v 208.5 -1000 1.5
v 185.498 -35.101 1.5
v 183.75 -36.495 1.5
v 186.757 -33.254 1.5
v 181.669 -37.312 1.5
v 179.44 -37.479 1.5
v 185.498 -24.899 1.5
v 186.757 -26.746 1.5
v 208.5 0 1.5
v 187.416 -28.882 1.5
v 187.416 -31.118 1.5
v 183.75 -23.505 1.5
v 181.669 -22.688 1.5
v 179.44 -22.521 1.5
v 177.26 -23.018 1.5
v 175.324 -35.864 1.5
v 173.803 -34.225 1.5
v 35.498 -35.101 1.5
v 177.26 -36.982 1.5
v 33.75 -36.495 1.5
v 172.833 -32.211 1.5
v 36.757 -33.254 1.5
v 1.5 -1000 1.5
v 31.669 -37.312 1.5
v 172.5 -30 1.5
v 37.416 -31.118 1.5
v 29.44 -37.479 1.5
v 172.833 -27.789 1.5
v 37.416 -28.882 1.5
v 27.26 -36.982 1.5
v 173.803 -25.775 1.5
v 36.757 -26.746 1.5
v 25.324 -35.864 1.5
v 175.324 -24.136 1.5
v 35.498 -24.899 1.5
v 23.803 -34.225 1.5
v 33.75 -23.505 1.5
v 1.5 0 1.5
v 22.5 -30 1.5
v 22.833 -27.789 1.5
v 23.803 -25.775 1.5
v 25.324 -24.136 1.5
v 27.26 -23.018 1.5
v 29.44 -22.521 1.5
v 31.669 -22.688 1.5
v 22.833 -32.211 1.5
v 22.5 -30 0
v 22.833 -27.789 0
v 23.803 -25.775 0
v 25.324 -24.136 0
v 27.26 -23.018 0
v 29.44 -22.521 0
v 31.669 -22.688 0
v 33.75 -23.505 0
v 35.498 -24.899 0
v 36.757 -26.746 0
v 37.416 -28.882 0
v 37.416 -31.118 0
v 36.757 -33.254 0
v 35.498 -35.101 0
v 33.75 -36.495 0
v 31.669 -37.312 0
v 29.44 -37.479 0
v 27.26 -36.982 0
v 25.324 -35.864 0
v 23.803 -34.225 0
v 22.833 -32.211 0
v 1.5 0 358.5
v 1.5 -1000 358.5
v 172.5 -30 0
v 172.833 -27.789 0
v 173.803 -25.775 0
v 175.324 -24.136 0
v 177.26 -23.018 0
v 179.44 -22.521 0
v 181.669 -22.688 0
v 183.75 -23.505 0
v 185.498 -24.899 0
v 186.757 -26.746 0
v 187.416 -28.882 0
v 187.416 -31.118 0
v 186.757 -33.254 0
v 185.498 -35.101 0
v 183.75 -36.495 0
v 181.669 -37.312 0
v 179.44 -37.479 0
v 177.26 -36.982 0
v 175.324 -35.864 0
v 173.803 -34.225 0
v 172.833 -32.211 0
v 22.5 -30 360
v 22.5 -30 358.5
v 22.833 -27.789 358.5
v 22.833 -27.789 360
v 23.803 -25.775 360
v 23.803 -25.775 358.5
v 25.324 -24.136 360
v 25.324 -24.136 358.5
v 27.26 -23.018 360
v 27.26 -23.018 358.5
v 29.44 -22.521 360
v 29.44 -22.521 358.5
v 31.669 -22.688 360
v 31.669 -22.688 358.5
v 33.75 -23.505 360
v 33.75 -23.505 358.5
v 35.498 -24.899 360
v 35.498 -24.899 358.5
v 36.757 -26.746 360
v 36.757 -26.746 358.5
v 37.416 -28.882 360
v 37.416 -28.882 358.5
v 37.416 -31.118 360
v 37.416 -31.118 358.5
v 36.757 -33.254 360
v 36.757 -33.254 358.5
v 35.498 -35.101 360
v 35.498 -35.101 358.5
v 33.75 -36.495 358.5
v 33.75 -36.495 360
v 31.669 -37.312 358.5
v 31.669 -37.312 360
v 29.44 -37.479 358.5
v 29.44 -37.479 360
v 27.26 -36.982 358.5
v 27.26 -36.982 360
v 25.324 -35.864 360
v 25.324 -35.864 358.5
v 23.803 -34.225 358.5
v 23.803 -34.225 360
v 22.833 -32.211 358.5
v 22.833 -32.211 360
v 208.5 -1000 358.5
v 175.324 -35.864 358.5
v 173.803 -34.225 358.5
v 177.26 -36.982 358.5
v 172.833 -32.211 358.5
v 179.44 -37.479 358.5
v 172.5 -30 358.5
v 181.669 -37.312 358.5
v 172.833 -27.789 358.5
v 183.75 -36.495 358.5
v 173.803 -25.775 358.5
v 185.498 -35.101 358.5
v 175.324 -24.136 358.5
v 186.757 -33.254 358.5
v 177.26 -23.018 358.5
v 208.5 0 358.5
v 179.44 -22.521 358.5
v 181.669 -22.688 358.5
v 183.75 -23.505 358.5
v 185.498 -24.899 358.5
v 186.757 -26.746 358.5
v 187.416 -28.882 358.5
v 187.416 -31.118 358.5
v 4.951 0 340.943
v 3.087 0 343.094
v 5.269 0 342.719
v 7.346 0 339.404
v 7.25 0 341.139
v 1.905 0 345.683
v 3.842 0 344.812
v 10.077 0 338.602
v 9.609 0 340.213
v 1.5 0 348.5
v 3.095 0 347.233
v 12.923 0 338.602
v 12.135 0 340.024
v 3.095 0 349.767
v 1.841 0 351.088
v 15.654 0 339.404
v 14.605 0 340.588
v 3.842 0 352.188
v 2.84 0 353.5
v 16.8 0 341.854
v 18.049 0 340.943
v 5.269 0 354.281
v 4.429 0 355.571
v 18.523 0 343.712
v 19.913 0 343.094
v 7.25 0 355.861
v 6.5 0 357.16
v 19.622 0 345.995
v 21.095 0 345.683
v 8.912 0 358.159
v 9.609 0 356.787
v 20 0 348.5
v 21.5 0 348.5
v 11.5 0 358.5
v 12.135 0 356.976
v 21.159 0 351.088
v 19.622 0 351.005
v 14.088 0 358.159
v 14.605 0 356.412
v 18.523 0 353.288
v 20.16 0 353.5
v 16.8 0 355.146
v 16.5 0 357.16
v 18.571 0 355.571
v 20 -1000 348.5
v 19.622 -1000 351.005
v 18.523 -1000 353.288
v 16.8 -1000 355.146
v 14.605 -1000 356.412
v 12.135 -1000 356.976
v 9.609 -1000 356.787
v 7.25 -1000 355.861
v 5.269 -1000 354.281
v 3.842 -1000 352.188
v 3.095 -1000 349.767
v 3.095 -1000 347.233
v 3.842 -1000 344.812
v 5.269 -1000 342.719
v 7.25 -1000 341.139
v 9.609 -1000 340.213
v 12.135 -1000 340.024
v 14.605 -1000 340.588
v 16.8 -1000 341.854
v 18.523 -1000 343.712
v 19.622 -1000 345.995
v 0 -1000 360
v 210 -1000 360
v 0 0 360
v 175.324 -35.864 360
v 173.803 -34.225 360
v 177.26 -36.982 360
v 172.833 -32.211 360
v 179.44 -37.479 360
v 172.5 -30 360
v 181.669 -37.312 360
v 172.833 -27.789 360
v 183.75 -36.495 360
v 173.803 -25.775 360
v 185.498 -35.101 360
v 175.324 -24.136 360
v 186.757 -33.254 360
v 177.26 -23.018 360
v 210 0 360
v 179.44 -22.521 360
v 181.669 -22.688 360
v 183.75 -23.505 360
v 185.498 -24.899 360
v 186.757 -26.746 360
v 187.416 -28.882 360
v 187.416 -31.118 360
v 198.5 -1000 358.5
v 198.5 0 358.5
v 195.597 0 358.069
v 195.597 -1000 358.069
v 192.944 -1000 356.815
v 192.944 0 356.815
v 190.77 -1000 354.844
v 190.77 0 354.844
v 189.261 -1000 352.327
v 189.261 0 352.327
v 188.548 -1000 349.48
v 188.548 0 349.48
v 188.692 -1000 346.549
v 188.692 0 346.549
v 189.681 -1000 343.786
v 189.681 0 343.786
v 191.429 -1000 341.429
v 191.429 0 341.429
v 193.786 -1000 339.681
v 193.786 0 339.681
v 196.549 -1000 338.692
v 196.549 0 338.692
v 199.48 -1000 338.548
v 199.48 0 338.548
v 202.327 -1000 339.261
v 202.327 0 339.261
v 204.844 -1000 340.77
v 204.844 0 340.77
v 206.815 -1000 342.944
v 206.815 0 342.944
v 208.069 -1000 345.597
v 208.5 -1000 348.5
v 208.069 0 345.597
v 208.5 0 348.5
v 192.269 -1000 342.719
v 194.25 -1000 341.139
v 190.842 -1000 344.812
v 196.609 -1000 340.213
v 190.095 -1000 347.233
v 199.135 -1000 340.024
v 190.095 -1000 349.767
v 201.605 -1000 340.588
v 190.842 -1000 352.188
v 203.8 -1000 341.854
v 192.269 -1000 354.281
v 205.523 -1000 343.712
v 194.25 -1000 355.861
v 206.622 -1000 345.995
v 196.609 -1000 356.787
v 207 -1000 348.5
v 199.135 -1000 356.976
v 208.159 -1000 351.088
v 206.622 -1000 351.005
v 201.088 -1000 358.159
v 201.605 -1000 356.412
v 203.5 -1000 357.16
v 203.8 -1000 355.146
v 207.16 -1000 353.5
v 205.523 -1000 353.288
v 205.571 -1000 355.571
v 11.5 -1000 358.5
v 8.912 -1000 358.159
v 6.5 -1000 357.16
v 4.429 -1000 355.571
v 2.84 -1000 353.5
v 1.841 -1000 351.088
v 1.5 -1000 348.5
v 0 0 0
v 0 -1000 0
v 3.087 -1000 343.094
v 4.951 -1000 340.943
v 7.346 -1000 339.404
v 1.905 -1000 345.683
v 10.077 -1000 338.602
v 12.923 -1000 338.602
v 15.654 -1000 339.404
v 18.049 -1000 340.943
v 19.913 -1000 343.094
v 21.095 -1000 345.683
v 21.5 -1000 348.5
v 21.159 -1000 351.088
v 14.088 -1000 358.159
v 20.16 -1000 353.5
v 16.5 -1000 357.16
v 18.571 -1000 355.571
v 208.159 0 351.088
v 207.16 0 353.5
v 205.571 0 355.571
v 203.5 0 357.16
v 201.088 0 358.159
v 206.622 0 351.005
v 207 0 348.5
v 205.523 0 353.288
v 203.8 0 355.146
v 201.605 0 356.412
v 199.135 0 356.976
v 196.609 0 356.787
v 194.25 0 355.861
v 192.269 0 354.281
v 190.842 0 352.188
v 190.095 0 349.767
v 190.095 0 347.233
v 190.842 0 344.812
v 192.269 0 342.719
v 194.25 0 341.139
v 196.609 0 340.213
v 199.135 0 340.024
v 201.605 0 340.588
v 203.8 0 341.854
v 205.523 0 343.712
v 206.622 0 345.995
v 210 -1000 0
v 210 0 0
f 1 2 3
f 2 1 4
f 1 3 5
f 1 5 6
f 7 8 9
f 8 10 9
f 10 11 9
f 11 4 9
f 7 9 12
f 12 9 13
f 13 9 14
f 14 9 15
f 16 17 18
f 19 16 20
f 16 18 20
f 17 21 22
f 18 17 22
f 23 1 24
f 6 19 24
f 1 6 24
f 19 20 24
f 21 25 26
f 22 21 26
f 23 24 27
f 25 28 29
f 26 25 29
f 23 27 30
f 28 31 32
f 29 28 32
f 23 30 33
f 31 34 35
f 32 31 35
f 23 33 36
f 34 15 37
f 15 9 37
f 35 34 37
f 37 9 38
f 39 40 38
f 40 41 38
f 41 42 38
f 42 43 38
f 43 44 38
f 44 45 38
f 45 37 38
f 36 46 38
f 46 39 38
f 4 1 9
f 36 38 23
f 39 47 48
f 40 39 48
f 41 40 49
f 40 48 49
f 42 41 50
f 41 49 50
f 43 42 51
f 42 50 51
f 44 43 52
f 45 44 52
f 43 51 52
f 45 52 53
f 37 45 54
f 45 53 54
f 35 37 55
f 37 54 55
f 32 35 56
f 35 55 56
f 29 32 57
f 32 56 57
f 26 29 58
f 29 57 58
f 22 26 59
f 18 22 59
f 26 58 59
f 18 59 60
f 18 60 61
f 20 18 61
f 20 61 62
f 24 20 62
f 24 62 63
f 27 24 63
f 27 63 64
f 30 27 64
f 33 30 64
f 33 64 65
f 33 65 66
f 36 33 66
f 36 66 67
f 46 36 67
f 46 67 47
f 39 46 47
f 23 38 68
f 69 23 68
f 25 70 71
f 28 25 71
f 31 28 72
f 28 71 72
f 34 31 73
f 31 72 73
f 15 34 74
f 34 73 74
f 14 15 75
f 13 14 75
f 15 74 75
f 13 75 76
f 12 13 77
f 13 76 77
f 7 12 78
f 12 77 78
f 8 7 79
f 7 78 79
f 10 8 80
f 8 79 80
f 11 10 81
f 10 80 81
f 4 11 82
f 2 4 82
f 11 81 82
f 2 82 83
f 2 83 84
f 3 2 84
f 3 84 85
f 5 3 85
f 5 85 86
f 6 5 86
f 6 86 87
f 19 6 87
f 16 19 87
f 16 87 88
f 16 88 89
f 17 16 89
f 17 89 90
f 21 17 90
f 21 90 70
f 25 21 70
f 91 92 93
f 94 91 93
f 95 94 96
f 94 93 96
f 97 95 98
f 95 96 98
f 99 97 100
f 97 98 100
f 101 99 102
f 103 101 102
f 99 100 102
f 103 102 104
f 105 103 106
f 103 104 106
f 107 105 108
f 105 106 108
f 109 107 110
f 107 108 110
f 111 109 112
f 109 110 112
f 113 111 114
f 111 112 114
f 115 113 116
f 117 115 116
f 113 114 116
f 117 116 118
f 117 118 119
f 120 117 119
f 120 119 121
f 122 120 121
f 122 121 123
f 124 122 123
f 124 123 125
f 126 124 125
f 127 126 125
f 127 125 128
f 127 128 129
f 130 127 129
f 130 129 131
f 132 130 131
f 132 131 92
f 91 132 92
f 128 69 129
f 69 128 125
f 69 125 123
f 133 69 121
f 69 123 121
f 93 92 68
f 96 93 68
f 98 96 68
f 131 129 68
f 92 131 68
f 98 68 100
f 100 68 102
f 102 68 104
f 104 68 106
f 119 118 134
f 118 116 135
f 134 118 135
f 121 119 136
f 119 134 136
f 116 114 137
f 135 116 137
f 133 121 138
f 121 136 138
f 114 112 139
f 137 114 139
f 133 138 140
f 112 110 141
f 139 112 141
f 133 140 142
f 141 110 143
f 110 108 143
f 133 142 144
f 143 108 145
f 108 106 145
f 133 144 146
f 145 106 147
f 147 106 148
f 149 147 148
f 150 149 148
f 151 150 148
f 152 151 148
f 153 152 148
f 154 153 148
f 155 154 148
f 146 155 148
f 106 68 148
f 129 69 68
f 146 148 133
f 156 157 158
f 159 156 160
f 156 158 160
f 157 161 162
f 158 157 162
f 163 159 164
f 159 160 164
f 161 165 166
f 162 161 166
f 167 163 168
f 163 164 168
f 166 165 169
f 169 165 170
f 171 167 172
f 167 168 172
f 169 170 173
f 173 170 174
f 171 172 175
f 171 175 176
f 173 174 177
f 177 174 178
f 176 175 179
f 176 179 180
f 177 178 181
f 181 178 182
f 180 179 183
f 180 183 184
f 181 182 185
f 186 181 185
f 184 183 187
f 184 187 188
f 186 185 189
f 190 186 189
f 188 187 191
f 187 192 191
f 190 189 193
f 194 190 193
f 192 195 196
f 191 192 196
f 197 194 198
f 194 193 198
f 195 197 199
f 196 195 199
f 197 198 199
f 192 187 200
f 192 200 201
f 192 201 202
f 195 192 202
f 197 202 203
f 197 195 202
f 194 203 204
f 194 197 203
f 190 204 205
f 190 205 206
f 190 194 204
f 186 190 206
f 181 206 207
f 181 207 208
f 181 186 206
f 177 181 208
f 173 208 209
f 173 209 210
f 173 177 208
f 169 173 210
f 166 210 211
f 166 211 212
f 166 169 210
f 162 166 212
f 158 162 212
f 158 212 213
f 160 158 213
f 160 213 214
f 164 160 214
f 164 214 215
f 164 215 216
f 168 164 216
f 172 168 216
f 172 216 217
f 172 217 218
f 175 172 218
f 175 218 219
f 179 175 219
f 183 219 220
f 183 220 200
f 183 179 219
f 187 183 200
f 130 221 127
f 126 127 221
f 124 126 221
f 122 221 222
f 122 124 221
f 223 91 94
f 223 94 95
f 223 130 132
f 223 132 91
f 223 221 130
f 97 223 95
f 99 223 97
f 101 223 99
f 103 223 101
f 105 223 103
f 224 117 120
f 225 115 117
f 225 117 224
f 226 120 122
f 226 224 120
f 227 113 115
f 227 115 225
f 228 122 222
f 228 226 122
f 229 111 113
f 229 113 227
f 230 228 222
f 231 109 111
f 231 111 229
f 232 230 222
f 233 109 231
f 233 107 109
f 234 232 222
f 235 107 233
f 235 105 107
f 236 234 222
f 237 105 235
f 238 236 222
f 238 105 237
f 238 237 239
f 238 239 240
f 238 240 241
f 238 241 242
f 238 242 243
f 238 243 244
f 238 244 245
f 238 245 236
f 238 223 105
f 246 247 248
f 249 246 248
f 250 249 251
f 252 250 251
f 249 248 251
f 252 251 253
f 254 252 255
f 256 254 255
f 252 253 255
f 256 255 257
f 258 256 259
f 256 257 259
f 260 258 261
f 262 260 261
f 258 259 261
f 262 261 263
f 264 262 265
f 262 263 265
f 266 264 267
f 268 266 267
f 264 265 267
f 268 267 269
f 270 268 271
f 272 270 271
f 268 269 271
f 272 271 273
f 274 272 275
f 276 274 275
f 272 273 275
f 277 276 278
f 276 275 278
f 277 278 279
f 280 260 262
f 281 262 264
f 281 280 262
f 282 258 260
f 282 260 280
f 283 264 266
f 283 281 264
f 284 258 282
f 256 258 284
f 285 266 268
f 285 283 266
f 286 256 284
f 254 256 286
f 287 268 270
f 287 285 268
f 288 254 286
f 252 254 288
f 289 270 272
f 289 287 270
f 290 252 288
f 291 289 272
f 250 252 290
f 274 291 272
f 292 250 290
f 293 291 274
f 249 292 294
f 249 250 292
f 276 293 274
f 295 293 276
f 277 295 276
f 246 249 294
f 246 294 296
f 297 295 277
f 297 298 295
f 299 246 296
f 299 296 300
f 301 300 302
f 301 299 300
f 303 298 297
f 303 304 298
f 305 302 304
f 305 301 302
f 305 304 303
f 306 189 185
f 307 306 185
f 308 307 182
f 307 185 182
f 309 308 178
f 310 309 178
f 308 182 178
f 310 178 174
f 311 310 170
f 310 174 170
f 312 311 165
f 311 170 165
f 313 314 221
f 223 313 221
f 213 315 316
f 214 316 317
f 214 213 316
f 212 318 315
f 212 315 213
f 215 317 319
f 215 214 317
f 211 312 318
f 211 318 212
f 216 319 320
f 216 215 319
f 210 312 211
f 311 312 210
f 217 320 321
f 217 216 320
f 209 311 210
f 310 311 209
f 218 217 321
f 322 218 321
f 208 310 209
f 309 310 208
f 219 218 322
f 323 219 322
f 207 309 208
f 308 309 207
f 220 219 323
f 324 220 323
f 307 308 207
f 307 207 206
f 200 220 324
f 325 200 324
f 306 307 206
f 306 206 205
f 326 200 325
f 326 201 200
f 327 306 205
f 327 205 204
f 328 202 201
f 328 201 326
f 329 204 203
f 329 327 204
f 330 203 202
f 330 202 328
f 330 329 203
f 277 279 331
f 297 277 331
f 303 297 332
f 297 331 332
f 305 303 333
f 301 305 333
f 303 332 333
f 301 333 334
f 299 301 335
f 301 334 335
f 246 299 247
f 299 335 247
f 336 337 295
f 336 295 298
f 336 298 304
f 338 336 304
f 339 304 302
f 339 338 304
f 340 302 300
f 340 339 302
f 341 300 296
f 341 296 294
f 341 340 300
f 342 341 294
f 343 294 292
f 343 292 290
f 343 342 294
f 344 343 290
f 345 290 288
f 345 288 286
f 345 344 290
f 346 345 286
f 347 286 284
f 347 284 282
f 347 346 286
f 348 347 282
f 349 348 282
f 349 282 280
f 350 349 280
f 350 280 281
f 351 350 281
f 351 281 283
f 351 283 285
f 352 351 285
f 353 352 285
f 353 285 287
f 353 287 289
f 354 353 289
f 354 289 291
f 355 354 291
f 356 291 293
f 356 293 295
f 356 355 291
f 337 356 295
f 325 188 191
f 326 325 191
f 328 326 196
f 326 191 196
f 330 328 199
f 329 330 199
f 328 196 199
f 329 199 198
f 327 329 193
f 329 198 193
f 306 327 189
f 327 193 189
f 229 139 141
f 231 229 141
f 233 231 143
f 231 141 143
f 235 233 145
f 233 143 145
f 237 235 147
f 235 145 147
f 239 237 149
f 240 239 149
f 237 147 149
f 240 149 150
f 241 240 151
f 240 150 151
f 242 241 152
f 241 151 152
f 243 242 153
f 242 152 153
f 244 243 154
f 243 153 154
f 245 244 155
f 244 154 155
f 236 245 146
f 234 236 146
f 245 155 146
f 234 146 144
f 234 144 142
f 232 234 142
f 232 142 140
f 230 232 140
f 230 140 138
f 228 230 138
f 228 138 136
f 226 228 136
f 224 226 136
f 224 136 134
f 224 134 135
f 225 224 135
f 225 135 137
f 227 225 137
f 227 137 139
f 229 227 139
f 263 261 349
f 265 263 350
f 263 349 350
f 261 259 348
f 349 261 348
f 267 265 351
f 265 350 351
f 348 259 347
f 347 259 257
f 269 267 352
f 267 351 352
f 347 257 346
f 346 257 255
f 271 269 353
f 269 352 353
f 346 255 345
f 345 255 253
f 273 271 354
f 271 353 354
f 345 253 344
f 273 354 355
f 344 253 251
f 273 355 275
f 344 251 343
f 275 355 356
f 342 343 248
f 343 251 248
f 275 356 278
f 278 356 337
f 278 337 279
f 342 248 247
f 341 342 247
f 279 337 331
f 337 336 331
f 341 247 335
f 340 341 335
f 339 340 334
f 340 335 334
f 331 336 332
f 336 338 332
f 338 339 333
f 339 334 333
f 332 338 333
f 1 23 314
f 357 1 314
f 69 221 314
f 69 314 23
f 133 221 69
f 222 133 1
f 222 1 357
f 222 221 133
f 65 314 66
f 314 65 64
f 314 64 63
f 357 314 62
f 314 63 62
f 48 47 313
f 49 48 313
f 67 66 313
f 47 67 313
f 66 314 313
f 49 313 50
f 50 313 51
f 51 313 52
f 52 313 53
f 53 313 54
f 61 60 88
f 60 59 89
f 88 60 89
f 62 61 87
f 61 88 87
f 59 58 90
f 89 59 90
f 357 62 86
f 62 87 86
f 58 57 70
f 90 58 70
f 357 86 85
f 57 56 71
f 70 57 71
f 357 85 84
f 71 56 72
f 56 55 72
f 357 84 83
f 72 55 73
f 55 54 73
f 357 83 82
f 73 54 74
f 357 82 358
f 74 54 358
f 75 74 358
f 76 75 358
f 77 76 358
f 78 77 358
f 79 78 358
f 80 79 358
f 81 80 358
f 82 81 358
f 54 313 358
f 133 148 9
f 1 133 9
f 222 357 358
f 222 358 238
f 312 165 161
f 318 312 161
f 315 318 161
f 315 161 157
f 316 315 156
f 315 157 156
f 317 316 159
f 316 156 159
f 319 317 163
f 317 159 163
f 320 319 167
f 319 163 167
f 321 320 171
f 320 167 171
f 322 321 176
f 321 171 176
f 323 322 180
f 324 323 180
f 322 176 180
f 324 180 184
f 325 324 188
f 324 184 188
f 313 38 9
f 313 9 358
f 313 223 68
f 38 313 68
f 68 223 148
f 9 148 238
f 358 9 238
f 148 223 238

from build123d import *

# Parameters (mm, degrees)
F0_W     = 210
F0_H     = 360
F1_DEPTH = 1000
F0_R     = 8.5
F3_D     = 15


with BuildPart() as f1:
    # F0 (on Front) → F1 (new body)
    with BuildSketch(Plane.XZ):
        with Locations((105, 180)):
            Rectangle(F0_W, F0_H)
        Polygon((1.5, 348.5), (1.5, 358.5), (11.5, 358.5), (198.5, 358.5), (208.5, 358.5), (208.5, 348.5), (208.5, 1.5), (1.5, 1.5), align=None, mode=Mode.SUBTRACT)
    extrude(amount=F1_DEPTH)

    # F3 (through all)
    with Locations(Plane.XY.offset(360)):
        with Locations((180, -30), (30, -30)):
            Hole(F3_D / 2)


with BuildPart() as f1b:
    # F0 (on Front) → F1, piece 2 (new body)
    with BuildSketch(Plane.XZ):
        with BuildLine():
            ThreePointArc((208.5, 348.5), (205.5710678119, 355.5710678119), (198.5, 358.5))
            ThreePointArc((198.5, 358.5), (191.4289321881, 341.4289321881), (208.5, 348.5))
        make_face()
        with Locations((198.5, 348.5)):
            Circle(F0_R, mode=Mode.SUBTRACT)
    extrude(amount=F1_DEPTH)


with BuildPart() as f1c:
    # F0 (on Front) → F1, piece 3 (new body)
    with BuildSketch(Plane.XZ):
        with BuildLine():
            ThreePointArc((21.5, 348.5), (18.5710678119, 355.5710678119), (11.5, 358.5))
            ThreePointArc((11.5, 358.5), (4.4289321881, 355.5710678119), (1.5, 348.5))
            ThreePointArc((1.5, 348.5), (11.5, 338.5), (21.5, 348.5))
        make_face()
        with Locations((11.5, 348.5)):
            Circle(F0_R, mode=Mode.SUBTRACT)
    extrude(amount=F1_DEPTH)


solid = Compound([f1.part, f1b.part, f1c.part])
